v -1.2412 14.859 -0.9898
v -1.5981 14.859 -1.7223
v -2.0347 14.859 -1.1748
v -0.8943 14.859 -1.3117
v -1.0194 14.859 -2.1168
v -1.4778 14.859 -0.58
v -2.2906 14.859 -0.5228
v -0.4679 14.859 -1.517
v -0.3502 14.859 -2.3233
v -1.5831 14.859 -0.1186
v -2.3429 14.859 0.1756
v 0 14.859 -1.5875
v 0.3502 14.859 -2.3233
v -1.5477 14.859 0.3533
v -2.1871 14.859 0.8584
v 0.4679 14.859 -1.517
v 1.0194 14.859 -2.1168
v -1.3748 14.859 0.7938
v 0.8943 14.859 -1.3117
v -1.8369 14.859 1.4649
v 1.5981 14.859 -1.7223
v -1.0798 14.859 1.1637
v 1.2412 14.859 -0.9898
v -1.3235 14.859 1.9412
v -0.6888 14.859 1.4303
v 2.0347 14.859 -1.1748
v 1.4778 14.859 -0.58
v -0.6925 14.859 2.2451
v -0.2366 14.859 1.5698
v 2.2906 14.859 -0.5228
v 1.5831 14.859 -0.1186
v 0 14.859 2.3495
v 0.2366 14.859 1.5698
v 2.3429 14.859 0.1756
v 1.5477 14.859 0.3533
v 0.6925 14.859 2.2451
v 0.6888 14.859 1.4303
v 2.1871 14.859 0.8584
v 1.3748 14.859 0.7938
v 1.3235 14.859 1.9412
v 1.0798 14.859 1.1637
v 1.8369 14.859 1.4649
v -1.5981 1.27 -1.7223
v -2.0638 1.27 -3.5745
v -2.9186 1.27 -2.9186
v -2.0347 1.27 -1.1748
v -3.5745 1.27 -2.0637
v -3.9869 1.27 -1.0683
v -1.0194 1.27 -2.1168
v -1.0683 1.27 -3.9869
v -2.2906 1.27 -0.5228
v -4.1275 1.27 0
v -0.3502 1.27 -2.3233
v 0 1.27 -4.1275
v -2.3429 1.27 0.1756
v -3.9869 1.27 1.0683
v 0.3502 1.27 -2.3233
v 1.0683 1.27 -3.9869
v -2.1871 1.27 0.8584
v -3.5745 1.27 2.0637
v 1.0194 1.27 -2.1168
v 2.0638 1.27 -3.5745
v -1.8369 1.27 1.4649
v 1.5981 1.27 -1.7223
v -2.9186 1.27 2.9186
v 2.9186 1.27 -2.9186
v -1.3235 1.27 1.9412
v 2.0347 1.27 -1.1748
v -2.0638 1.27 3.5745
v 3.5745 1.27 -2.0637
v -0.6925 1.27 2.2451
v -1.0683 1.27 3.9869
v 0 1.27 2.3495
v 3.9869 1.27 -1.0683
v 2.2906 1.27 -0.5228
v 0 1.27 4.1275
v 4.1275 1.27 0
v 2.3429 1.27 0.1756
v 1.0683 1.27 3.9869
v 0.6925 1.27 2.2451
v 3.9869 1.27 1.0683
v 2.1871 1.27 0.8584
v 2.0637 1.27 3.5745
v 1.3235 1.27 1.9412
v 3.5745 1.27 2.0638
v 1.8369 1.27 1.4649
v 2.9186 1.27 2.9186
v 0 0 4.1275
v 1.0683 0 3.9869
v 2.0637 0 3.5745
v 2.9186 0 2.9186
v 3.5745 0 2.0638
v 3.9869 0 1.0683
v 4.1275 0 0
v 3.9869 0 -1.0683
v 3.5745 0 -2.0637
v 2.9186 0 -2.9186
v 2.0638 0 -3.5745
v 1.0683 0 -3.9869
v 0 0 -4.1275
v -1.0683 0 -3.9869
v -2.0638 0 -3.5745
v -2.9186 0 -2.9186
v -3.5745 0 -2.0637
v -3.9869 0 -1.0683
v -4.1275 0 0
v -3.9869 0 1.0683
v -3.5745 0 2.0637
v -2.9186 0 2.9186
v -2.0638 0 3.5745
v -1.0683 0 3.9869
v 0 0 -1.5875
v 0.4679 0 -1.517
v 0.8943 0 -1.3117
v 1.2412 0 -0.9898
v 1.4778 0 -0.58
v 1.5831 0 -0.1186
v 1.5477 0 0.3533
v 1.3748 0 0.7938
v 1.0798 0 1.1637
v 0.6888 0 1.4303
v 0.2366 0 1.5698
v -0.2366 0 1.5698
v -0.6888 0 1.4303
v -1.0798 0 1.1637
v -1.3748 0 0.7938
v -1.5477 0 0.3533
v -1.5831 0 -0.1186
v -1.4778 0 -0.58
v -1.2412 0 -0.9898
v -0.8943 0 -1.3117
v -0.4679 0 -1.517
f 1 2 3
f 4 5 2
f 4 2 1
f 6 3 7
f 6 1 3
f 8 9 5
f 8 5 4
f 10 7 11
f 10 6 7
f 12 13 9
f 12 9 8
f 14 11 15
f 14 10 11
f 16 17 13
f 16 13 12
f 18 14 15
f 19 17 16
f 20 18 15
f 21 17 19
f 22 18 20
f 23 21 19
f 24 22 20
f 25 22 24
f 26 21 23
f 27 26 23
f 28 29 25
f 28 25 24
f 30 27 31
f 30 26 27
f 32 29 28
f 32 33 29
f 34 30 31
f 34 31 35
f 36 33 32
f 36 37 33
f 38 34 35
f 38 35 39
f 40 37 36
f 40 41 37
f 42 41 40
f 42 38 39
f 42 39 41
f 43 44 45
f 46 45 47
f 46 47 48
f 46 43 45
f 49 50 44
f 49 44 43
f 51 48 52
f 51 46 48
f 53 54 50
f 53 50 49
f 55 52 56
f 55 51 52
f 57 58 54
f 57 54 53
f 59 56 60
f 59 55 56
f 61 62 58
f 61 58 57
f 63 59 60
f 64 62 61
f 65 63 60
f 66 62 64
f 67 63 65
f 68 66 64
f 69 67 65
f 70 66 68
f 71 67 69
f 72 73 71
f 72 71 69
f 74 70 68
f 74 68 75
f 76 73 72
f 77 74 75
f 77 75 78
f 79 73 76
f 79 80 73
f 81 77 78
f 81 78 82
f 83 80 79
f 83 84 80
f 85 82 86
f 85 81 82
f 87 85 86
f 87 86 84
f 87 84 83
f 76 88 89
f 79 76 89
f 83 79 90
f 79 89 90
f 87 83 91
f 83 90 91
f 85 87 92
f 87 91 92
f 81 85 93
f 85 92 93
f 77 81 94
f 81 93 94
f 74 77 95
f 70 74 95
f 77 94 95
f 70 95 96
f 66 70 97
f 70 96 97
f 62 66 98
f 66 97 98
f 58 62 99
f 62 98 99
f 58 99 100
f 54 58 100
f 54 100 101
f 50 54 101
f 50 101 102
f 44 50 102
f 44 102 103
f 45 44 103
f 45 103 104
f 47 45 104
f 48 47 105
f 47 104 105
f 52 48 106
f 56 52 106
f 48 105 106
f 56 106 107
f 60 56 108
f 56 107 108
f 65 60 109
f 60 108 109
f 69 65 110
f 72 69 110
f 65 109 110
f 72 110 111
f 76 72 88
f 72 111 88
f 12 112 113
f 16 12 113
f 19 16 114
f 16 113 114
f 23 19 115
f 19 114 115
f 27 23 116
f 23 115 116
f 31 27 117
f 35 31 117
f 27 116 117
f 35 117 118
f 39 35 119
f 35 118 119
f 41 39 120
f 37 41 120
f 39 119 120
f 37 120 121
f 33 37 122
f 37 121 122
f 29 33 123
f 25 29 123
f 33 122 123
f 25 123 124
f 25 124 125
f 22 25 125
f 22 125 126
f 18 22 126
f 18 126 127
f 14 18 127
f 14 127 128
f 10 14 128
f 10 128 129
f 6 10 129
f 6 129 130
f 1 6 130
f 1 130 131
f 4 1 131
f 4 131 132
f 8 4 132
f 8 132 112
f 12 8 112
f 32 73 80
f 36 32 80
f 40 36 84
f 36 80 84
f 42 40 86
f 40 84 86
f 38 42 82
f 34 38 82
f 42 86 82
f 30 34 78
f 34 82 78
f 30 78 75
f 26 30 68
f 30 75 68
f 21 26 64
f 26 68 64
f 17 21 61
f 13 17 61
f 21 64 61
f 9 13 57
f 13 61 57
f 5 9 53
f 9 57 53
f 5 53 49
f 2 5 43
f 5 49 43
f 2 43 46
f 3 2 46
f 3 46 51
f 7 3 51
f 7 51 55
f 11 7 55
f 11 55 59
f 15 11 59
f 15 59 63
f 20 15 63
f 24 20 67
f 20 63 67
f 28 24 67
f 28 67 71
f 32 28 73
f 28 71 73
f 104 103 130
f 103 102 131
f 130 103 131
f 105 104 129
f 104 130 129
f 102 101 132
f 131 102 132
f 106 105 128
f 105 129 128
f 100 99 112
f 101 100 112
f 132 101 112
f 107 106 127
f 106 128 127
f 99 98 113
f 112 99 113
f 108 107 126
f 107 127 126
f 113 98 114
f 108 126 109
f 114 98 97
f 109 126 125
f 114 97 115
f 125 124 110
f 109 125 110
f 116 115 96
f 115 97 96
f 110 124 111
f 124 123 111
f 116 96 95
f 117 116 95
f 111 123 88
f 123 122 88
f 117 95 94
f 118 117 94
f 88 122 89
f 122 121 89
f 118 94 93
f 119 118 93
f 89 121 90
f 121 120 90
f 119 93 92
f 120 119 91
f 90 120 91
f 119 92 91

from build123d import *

# Parameters (mm, degrees)
SKETCH1_R           = 4.1275
BOSS_EXTRUDE1_DEPTH = 1.27
SKETCH2_R           = 2.3495
BOSS_EXTRUDE2_DEPTH = 13.589
SKETCH3_R           = 1.5875
CUT_EXTRUDE2_DEPTH  = 16.964410215


with BuildPart() as part:
    # Sketch1 → Boss-Extrude1 (new body)
    with BuildSketch(Plane(origin=(0, 0, 0), x_dir=(1, 0, 0), z_dir=(0, 1, 0))):
        with Locations(Location((0, 0, 0), (0, 0, 270))):
            Circle(SKETCH1_R)
    extrude(amount=BOSS_EXTRUDE1_DEPTH)

    # Sketch2 → Boss-Extrude2 (add)
    with BuildSketch(Plane(origin=(0, 1.27, 0), x_dir=(1, 0, 0), z_dir=(0, 1, 0))):
        with Locations(Location((0, 0, 0), (0, 0, 270))):
            Circle(SKETCH2_R)
    extrude(amount=BOSS_EXTRUDE2_DEPTH)

    # Sketch3 → Cut-Extrude2 (cut, through all)
    with BuildSketch(Plane.XZ):
        with Locations(Location((0, 0, 0), (0, 0, 270))):
            Circle(SKETCH3_R)
    extrude(amount=-CUT_EXTRUDE2_DEPTH, mode=Mode.SUBTRACT)


solid = part.part
